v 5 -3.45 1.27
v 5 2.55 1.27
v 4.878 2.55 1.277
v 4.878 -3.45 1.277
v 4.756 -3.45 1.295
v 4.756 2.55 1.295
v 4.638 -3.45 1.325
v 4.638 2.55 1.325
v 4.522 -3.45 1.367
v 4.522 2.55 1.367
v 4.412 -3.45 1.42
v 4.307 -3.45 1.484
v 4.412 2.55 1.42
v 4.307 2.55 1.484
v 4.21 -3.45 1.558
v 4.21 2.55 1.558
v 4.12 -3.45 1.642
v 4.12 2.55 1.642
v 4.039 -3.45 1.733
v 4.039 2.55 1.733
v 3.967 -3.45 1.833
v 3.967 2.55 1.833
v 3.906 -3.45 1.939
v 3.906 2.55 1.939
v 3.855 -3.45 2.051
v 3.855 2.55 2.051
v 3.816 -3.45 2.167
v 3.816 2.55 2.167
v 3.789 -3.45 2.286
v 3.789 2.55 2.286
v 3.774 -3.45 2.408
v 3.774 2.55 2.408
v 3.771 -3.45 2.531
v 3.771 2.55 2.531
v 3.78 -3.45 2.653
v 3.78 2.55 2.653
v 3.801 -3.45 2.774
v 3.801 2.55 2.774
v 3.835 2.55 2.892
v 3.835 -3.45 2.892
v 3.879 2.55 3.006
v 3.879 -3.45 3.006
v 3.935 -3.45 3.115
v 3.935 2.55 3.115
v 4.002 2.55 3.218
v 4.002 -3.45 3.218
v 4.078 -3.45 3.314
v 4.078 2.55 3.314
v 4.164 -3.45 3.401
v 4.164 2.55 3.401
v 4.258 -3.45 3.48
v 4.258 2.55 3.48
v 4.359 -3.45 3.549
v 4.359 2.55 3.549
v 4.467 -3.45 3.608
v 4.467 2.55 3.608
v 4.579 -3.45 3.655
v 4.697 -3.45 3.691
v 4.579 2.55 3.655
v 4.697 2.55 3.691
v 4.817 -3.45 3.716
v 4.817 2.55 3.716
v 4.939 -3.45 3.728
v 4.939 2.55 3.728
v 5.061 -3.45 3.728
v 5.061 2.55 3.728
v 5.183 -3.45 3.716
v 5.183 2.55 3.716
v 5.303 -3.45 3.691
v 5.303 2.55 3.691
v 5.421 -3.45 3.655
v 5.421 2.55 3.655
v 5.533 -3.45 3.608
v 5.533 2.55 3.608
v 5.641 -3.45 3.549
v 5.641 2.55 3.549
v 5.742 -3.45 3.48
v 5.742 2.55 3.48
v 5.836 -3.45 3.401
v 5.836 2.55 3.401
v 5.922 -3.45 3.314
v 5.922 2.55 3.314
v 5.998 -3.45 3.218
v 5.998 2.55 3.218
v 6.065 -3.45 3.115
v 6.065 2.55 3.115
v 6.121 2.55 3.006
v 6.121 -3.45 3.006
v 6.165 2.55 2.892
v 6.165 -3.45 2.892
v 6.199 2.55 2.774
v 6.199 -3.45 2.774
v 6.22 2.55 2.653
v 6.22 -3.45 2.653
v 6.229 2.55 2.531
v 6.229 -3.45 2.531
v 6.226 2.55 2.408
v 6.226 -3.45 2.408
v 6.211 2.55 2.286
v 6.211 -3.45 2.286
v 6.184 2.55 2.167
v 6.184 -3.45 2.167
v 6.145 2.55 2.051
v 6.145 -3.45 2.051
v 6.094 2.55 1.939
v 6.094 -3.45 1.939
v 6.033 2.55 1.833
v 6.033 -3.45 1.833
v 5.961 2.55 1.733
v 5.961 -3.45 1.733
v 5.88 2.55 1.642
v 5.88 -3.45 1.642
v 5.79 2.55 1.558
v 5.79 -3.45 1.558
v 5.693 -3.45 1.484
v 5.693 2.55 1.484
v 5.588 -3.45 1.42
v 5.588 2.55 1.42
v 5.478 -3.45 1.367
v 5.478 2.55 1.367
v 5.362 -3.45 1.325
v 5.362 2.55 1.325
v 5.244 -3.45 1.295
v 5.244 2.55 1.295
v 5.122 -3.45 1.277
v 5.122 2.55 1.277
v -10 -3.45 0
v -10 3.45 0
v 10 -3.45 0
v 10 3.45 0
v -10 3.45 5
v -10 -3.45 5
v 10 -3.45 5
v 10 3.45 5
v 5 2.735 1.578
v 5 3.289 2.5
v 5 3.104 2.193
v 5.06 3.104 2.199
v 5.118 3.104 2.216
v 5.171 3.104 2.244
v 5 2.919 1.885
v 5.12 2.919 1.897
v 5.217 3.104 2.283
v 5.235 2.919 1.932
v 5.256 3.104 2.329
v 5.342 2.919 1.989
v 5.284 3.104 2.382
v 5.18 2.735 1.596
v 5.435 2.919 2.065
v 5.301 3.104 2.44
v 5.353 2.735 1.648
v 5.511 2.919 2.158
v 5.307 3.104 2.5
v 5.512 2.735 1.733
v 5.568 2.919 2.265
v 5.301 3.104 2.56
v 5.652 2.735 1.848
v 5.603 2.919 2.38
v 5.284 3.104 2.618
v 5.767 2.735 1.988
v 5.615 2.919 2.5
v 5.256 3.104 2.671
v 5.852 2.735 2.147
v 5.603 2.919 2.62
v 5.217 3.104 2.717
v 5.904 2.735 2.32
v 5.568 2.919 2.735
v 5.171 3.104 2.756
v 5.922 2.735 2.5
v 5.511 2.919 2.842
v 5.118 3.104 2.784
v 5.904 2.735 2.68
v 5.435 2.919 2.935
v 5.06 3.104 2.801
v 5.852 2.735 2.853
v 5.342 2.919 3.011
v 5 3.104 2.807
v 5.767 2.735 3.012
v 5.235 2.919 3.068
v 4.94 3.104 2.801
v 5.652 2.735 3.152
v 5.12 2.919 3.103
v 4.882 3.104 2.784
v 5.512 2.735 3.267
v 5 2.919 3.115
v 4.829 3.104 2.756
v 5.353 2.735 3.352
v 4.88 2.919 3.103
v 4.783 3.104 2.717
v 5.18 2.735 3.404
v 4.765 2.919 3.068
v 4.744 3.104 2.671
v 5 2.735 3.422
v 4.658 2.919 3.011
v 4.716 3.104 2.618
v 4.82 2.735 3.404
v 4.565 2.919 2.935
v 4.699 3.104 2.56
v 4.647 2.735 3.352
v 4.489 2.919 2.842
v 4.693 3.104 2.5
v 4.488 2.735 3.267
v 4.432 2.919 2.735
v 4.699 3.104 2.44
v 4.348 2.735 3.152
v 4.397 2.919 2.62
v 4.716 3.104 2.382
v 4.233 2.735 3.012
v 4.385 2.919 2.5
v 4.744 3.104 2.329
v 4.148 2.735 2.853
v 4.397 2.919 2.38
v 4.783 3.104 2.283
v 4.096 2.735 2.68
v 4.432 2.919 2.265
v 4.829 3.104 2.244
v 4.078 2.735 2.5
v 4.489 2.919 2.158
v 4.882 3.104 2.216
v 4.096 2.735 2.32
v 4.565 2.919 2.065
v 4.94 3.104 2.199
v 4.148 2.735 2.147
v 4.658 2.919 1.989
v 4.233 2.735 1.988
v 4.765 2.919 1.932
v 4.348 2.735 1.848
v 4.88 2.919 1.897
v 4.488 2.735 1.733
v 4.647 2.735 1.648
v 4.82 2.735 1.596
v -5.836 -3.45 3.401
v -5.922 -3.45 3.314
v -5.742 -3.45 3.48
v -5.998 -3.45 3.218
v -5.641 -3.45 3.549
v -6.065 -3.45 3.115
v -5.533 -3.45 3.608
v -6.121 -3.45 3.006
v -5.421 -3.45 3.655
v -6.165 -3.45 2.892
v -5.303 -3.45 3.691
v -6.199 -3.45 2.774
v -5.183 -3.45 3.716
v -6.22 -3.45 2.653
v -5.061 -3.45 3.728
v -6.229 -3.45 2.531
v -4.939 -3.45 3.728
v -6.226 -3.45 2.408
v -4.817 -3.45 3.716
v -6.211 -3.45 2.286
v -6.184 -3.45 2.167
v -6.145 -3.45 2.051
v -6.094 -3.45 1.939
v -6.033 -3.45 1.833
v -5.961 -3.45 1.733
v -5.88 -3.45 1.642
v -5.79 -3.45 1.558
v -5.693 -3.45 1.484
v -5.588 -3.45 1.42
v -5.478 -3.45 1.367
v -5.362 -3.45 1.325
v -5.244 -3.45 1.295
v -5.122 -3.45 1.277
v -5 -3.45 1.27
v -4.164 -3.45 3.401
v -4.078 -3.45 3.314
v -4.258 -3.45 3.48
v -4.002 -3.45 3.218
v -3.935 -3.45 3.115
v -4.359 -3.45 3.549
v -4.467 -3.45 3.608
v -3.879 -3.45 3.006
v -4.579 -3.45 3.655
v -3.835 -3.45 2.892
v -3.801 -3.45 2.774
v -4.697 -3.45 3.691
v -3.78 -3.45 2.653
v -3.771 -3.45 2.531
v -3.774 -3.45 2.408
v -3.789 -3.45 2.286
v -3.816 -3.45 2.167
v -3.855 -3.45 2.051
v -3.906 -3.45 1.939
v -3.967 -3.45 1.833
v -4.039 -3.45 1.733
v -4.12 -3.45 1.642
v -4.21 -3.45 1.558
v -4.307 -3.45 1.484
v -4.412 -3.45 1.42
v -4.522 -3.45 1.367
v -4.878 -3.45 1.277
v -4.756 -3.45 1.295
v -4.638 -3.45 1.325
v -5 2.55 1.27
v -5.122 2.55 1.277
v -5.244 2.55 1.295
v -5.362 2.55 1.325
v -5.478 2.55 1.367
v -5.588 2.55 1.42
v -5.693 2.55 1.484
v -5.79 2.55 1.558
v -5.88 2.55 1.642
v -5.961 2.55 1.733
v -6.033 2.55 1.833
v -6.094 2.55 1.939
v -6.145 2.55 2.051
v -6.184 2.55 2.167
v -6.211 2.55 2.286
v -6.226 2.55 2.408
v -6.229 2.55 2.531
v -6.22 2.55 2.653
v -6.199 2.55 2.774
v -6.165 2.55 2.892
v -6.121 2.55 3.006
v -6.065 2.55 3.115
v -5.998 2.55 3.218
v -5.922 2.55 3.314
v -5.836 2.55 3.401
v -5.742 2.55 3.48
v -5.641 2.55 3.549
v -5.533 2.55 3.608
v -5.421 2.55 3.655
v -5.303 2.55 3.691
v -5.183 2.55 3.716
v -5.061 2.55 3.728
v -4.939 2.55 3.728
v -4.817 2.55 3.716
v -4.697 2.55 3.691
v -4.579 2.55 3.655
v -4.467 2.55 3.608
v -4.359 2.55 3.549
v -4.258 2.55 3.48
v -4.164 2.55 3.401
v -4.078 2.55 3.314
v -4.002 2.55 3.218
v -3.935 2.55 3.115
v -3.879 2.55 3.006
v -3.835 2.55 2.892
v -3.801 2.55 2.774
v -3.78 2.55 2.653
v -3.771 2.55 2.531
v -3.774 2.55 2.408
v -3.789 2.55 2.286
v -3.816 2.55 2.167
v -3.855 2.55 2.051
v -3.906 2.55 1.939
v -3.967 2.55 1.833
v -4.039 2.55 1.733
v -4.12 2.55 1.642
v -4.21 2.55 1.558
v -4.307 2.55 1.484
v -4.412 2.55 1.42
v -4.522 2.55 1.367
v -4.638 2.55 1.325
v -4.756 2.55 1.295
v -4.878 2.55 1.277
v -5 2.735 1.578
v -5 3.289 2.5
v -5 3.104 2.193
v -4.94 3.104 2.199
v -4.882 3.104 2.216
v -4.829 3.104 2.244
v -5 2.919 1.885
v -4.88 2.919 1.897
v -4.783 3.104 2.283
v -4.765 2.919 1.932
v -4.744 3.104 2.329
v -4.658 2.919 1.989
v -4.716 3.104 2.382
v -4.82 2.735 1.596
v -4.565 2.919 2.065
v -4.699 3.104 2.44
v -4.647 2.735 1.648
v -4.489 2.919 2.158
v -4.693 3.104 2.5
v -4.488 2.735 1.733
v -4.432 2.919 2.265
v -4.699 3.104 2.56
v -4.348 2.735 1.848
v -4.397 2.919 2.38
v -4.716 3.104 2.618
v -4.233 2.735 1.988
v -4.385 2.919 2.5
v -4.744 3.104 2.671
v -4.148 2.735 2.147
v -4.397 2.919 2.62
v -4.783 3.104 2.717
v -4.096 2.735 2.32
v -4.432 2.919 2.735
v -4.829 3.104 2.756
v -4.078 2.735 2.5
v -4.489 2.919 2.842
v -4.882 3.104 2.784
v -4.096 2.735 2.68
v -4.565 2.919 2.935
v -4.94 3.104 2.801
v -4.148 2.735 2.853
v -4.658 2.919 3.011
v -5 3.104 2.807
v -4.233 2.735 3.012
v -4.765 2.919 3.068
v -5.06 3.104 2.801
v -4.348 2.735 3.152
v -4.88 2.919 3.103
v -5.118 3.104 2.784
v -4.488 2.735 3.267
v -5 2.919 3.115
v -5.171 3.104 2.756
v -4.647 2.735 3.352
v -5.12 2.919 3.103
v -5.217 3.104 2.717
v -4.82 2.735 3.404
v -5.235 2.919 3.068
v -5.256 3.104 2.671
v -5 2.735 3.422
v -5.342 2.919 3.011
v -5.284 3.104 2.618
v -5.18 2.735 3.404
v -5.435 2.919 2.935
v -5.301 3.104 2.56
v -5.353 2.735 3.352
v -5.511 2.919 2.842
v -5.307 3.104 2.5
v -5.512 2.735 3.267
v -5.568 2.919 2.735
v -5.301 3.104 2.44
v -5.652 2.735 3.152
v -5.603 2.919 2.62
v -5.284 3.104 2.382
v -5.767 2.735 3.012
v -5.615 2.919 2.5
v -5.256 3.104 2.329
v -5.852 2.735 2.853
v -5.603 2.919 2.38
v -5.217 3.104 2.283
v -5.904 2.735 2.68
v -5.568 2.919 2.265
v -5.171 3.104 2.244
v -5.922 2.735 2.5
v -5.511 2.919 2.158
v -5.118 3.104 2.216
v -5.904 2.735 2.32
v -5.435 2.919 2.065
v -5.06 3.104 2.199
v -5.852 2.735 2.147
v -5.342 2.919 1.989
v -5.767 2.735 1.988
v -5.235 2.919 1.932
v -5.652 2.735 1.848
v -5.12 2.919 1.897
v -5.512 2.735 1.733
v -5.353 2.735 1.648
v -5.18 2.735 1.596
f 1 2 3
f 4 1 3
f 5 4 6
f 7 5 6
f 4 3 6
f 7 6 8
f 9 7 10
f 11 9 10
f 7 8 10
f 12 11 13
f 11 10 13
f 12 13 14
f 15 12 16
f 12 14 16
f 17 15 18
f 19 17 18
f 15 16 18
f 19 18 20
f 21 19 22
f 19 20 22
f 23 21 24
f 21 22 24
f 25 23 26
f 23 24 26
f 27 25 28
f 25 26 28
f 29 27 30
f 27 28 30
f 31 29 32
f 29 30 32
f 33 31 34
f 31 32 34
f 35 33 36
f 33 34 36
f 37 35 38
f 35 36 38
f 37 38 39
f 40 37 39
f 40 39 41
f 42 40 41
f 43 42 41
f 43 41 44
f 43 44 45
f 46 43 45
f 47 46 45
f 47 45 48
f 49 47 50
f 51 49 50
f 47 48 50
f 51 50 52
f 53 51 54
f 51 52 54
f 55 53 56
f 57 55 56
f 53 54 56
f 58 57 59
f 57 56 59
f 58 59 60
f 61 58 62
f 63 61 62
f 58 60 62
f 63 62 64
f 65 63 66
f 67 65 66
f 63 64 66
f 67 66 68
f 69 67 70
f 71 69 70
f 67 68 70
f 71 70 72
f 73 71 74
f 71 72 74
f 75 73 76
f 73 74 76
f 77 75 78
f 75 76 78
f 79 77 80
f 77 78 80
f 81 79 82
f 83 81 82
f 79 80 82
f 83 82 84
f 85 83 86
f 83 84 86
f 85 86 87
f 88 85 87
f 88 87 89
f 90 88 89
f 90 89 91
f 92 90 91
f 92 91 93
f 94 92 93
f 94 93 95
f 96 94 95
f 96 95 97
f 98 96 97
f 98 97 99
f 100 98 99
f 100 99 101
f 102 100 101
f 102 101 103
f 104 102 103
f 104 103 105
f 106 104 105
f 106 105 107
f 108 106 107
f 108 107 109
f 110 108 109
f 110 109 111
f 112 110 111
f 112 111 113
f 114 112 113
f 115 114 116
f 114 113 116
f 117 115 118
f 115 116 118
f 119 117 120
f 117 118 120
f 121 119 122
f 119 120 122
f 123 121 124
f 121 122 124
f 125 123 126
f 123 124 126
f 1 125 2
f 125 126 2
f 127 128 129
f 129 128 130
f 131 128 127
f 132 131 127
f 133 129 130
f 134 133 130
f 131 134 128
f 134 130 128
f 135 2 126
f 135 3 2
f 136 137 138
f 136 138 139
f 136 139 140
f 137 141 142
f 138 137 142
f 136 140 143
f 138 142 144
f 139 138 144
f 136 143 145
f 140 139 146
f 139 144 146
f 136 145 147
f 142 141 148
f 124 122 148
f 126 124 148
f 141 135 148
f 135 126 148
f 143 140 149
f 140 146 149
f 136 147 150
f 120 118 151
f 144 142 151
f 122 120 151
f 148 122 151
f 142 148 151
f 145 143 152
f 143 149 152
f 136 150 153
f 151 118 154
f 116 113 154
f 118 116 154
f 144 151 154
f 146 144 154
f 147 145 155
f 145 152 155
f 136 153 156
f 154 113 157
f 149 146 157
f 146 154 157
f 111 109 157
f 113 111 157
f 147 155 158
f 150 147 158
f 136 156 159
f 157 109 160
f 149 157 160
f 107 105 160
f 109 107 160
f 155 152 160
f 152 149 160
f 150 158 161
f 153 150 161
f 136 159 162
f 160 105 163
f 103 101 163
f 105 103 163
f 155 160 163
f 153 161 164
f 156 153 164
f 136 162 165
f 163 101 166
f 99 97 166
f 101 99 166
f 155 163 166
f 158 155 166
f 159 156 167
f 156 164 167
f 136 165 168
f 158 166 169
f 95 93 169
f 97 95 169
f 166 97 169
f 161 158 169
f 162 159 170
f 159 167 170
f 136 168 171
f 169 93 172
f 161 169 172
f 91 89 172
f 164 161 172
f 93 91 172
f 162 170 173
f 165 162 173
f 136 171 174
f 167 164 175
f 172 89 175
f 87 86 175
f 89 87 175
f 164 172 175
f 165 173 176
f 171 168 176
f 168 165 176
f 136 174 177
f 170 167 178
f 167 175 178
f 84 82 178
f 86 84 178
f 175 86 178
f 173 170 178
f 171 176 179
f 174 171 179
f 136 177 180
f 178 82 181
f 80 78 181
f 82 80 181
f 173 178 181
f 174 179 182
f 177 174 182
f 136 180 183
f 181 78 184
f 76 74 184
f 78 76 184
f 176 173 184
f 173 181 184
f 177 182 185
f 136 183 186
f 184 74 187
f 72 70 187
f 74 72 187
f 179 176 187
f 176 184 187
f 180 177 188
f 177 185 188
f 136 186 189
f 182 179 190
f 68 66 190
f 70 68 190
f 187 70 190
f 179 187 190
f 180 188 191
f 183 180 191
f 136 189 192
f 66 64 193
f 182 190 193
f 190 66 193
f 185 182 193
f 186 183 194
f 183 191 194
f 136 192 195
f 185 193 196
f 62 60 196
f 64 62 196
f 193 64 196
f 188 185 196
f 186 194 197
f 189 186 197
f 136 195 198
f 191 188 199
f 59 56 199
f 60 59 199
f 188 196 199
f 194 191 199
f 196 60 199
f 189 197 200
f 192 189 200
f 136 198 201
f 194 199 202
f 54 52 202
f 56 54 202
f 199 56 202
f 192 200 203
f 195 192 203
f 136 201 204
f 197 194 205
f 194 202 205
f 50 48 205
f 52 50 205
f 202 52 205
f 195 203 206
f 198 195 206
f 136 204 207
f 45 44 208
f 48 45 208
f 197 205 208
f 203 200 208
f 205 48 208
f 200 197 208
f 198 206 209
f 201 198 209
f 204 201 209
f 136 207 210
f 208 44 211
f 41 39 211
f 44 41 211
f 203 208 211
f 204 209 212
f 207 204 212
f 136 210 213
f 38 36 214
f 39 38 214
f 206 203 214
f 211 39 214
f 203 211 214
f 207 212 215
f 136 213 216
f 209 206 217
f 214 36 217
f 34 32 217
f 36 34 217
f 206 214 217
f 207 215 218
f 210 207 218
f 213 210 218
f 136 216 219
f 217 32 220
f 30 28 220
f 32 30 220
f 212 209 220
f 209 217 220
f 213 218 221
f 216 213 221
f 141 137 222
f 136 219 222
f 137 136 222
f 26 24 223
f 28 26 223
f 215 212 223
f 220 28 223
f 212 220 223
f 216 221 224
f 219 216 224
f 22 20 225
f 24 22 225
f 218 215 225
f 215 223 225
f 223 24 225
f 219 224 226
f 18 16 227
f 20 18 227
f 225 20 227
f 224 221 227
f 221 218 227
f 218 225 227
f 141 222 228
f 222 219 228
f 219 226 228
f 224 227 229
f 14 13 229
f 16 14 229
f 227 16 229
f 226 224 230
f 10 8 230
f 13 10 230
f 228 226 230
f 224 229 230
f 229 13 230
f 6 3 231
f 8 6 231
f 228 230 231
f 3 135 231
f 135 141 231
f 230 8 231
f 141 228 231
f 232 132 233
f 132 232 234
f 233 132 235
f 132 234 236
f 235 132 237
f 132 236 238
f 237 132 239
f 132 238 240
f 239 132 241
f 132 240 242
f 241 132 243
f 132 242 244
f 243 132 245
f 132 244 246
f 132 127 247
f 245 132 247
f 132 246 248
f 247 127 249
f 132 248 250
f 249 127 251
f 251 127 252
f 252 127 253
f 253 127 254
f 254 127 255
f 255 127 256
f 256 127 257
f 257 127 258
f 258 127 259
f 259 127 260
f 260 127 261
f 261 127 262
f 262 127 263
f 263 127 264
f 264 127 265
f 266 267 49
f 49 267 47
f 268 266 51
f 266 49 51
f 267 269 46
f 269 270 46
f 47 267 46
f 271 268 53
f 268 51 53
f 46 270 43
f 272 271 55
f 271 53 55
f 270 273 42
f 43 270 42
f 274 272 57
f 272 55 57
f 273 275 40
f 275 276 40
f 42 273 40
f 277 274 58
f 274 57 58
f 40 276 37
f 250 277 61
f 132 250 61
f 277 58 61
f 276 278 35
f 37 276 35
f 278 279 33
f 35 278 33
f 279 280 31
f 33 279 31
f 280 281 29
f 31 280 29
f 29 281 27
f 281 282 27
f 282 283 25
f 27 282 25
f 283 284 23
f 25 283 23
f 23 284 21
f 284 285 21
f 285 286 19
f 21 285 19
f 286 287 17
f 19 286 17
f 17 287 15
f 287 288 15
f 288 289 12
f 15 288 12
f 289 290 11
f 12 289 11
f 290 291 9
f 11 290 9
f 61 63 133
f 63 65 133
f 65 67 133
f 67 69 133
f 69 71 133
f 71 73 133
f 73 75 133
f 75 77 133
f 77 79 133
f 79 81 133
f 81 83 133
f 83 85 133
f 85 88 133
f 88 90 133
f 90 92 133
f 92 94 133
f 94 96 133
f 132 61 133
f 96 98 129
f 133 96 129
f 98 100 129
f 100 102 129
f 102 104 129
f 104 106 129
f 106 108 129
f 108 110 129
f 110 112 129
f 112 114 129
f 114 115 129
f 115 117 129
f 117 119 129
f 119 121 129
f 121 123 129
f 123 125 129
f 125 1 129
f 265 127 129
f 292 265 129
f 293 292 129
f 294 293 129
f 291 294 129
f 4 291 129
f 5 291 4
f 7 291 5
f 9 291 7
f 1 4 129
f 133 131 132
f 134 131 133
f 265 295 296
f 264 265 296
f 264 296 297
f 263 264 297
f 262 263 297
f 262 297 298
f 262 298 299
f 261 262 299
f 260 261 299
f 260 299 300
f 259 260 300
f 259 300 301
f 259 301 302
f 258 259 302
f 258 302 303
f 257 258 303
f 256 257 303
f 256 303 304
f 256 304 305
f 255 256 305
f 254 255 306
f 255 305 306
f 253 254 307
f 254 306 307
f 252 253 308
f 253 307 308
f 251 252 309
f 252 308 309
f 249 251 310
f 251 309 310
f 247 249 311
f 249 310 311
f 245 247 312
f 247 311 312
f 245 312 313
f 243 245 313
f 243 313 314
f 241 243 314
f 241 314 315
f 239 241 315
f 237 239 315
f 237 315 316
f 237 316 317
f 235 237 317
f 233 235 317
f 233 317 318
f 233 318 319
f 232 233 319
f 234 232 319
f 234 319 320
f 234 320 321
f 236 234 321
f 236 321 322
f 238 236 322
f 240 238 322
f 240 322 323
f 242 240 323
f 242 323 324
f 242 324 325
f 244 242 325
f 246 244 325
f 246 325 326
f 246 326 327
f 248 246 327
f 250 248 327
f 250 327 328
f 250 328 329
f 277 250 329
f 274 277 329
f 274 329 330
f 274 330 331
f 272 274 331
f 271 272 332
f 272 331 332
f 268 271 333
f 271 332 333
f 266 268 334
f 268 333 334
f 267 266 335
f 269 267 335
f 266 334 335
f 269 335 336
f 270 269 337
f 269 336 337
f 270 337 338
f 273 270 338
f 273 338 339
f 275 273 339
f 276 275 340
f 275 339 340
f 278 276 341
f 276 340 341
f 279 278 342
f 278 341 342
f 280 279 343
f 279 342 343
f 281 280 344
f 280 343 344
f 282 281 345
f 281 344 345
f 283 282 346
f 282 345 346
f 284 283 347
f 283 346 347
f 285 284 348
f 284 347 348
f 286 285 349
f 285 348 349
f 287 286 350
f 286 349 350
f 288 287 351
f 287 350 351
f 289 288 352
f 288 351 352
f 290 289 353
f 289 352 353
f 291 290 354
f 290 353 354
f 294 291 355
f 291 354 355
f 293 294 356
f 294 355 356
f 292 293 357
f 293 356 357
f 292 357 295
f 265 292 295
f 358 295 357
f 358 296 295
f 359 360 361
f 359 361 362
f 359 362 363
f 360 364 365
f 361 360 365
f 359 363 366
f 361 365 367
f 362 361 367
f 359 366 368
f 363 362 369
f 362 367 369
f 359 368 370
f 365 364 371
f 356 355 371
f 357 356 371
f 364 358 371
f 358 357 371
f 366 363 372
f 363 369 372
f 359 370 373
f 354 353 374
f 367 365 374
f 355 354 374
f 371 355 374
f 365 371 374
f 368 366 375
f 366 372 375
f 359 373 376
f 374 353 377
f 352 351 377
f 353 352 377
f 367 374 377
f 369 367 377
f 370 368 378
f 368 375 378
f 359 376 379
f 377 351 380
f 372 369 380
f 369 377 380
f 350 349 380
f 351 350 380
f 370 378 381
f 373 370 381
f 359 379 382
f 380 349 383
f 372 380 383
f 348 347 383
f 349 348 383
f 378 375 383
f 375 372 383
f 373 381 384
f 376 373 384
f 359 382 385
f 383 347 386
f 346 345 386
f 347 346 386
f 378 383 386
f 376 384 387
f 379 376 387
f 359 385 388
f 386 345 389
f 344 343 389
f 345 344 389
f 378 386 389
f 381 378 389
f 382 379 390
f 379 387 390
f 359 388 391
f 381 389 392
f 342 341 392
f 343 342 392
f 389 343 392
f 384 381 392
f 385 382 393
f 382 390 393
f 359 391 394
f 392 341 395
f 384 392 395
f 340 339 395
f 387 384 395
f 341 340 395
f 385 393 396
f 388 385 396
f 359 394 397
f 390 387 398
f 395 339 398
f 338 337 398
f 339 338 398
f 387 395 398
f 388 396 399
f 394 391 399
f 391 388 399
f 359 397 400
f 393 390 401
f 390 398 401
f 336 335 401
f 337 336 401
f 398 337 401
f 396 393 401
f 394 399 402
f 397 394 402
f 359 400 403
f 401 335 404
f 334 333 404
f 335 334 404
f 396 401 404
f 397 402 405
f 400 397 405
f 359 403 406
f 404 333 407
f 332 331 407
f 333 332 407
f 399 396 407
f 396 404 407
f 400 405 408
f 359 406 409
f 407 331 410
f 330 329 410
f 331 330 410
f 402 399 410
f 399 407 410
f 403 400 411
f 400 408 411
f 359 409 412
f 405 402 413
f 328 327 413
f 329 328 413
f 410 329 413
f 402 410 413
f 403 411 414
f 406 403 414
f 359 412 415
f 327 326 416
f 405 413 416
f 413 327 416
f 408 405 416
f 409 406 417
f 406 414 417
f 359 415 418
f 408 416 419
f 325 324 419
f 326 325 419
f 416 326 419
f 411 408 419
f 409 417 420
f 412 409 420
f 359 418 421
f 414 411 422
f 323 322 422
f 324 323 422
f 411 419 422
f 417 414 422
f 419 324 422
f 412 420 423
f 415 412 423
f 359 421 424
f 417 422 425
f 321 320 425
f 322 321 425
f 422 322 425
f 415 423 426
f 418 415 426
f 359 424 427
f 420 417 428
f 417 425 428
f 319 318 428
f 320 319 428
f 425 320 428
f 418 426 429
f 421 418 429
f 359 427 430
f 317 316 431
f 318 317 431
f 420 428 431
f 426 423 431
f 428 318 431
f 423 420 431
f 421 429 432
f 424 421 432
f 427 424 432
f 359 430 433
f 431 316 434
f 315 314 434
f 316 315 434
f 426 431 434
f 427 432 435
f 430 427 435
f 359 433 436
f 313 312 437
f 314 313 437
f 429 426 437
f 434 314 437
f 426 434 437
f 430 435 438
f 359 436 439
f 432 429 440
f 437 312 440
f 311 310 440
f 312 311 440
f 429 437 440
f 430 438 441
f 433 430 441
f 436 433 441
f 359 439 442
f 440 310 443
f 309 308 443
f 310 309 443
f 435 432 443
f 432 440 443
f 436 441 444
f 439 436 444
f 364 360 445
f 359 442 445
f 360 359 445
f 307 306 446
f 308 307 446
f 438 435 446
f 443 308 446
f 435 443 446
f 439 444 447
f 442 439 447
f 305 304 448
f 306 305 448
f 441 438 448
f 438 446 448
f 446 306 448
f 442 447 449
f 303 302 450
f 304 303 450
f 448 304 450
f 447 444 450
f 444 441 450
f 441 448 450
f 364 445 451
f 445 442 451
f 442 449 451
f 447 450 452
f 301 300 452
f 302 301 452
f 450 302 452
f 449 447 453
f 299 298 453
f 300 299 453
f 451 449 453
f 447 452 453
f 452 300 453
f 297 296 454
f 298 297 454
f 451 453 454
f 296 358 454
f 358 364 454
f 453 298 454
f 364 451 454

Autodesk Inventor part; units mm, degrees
ref_plane "YZ Plane" through (0, 0, 0) normal (1, 0, 0) x (0, 1, 0)
ref_plane "XZ Plane" through (0, 0, 0) normal (0, 1, 0) x (-1, 0, 0)
ref_plane "XY Plane" through (0, 0, 0) normal (0, 0, 1) x (1, 0, 0)
sketch "Sketch1" plane through (0, 0, 0) normal (0, 0, 1) x (1, 0, 0)
  line L0 (-10, -3.45) -> (10, -3.45)
  line L1 (10, -3.45) -> (10, 3.45)
  line L2 (10, 3.45) -> (-10, 3.45)
  line L3 (-10, 3.45) -> (-10, -3.45)
  line L4 (-10, -3.45) -> (10, 3.45) construction
  line L5 (10, -3.45) -> (-10, 3.45) construction
  point P0 (0, 0)
  dimension "d0" = 20
  dimension "d1" = 6.9
extrude "Extrusion1" add sketch "Sketch1" along normal blind 5
sketch "Sketch2" plane through (-10, -3.45, 0) normal (0, -1, 0) x (1, 0, 0)
  line L0 (0, 0) -> (20, 0) construction
  line L1 (20, 0) -> (20, 5) construction
  line L2 (0, 5) -> (20, 5) construction
  line L3 (0, 0) -> (0, 5) construction
  line L4 (0, 2.5) -> (20, 2.5) construction
  line L5 (10, 0) -> (10, 9.5166) construction
  point P0 (5, 2.5)
  point P1 (15, 2.5)
  dimension "d4" = 5
hole "Hole1" at (-5, -3.45, 2.5) at (5, -3.45, 2.5) direction (0, 1, 0) diameter 2.459 depth 6 tip angle 118 thread size "M3x0.5" class "6H" standard "ISO Metric profile"
equation "\"d1\" = front_length"
equation "\"front_length\" = 6.9"
properties part number "tap_straight_bottom" material "Aluminum 6061"
